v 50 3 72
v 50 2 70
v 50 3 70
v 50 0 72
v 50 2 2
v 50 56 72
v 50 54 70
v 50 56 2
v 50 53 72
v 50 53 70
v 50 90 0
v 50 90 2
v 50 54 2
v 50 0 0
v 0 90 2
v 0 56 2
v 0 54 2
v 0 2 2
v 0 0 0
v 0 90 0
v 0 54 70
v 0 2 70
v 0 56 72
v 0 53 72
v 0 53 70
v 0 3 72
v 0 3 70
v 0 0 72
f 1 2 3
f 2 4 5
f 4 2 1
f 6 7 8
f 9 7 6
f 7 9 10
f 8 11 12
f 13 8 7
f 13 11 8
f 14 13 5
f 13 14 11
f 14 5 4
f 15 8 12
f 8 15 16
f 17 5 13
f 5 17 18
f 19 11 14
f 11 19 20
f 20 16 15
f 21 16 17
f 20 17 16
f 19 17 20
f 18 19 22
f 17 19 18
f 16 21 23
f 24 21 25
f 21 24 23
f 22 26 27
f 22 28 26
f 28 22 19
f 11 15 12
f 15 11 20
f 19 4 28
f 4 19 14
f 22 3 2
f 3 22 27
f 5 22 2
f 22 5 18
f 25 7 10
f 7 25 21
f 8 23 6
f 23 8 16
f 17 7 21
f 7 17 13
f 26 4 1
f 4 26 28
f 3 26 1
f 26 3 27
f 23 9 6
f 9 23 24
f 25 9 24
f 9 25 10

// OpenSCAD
$cm = 10;

// KC Figure
$plane_x = 11 * $cm;
$plane_y = $plane_x;

// Name Tag
$plane_x = 5 * $cm;
$plane_y = 9 * $cm;

$plane_height = 0.2 * $cm;
$leg_distance = 5.2 * $cm; // The desk wall is 5.2cm thick
$leg = 7 * $cm;
$leg_width = 0.2 * $cm;
$leg_clip = 0.1 * $cm;

cube([$plane_x,$plane_y,$plane_height]);
cube([$plane_x,$leg_width,$leg]);
translate([0, $leg_distance + $leg_width, 0])
    cube([$plane_x,$leg_width,$leg]);

translate([0,0, $leg])
    cube([$plane_x,$leg_width+$leg_clip,$leg_width]);

translate([0,$leg_distance+$leg_width-$leg_clip, $leg])
    cube([$plane_x,$leg_width+$leg_clip,$leg_width]);
